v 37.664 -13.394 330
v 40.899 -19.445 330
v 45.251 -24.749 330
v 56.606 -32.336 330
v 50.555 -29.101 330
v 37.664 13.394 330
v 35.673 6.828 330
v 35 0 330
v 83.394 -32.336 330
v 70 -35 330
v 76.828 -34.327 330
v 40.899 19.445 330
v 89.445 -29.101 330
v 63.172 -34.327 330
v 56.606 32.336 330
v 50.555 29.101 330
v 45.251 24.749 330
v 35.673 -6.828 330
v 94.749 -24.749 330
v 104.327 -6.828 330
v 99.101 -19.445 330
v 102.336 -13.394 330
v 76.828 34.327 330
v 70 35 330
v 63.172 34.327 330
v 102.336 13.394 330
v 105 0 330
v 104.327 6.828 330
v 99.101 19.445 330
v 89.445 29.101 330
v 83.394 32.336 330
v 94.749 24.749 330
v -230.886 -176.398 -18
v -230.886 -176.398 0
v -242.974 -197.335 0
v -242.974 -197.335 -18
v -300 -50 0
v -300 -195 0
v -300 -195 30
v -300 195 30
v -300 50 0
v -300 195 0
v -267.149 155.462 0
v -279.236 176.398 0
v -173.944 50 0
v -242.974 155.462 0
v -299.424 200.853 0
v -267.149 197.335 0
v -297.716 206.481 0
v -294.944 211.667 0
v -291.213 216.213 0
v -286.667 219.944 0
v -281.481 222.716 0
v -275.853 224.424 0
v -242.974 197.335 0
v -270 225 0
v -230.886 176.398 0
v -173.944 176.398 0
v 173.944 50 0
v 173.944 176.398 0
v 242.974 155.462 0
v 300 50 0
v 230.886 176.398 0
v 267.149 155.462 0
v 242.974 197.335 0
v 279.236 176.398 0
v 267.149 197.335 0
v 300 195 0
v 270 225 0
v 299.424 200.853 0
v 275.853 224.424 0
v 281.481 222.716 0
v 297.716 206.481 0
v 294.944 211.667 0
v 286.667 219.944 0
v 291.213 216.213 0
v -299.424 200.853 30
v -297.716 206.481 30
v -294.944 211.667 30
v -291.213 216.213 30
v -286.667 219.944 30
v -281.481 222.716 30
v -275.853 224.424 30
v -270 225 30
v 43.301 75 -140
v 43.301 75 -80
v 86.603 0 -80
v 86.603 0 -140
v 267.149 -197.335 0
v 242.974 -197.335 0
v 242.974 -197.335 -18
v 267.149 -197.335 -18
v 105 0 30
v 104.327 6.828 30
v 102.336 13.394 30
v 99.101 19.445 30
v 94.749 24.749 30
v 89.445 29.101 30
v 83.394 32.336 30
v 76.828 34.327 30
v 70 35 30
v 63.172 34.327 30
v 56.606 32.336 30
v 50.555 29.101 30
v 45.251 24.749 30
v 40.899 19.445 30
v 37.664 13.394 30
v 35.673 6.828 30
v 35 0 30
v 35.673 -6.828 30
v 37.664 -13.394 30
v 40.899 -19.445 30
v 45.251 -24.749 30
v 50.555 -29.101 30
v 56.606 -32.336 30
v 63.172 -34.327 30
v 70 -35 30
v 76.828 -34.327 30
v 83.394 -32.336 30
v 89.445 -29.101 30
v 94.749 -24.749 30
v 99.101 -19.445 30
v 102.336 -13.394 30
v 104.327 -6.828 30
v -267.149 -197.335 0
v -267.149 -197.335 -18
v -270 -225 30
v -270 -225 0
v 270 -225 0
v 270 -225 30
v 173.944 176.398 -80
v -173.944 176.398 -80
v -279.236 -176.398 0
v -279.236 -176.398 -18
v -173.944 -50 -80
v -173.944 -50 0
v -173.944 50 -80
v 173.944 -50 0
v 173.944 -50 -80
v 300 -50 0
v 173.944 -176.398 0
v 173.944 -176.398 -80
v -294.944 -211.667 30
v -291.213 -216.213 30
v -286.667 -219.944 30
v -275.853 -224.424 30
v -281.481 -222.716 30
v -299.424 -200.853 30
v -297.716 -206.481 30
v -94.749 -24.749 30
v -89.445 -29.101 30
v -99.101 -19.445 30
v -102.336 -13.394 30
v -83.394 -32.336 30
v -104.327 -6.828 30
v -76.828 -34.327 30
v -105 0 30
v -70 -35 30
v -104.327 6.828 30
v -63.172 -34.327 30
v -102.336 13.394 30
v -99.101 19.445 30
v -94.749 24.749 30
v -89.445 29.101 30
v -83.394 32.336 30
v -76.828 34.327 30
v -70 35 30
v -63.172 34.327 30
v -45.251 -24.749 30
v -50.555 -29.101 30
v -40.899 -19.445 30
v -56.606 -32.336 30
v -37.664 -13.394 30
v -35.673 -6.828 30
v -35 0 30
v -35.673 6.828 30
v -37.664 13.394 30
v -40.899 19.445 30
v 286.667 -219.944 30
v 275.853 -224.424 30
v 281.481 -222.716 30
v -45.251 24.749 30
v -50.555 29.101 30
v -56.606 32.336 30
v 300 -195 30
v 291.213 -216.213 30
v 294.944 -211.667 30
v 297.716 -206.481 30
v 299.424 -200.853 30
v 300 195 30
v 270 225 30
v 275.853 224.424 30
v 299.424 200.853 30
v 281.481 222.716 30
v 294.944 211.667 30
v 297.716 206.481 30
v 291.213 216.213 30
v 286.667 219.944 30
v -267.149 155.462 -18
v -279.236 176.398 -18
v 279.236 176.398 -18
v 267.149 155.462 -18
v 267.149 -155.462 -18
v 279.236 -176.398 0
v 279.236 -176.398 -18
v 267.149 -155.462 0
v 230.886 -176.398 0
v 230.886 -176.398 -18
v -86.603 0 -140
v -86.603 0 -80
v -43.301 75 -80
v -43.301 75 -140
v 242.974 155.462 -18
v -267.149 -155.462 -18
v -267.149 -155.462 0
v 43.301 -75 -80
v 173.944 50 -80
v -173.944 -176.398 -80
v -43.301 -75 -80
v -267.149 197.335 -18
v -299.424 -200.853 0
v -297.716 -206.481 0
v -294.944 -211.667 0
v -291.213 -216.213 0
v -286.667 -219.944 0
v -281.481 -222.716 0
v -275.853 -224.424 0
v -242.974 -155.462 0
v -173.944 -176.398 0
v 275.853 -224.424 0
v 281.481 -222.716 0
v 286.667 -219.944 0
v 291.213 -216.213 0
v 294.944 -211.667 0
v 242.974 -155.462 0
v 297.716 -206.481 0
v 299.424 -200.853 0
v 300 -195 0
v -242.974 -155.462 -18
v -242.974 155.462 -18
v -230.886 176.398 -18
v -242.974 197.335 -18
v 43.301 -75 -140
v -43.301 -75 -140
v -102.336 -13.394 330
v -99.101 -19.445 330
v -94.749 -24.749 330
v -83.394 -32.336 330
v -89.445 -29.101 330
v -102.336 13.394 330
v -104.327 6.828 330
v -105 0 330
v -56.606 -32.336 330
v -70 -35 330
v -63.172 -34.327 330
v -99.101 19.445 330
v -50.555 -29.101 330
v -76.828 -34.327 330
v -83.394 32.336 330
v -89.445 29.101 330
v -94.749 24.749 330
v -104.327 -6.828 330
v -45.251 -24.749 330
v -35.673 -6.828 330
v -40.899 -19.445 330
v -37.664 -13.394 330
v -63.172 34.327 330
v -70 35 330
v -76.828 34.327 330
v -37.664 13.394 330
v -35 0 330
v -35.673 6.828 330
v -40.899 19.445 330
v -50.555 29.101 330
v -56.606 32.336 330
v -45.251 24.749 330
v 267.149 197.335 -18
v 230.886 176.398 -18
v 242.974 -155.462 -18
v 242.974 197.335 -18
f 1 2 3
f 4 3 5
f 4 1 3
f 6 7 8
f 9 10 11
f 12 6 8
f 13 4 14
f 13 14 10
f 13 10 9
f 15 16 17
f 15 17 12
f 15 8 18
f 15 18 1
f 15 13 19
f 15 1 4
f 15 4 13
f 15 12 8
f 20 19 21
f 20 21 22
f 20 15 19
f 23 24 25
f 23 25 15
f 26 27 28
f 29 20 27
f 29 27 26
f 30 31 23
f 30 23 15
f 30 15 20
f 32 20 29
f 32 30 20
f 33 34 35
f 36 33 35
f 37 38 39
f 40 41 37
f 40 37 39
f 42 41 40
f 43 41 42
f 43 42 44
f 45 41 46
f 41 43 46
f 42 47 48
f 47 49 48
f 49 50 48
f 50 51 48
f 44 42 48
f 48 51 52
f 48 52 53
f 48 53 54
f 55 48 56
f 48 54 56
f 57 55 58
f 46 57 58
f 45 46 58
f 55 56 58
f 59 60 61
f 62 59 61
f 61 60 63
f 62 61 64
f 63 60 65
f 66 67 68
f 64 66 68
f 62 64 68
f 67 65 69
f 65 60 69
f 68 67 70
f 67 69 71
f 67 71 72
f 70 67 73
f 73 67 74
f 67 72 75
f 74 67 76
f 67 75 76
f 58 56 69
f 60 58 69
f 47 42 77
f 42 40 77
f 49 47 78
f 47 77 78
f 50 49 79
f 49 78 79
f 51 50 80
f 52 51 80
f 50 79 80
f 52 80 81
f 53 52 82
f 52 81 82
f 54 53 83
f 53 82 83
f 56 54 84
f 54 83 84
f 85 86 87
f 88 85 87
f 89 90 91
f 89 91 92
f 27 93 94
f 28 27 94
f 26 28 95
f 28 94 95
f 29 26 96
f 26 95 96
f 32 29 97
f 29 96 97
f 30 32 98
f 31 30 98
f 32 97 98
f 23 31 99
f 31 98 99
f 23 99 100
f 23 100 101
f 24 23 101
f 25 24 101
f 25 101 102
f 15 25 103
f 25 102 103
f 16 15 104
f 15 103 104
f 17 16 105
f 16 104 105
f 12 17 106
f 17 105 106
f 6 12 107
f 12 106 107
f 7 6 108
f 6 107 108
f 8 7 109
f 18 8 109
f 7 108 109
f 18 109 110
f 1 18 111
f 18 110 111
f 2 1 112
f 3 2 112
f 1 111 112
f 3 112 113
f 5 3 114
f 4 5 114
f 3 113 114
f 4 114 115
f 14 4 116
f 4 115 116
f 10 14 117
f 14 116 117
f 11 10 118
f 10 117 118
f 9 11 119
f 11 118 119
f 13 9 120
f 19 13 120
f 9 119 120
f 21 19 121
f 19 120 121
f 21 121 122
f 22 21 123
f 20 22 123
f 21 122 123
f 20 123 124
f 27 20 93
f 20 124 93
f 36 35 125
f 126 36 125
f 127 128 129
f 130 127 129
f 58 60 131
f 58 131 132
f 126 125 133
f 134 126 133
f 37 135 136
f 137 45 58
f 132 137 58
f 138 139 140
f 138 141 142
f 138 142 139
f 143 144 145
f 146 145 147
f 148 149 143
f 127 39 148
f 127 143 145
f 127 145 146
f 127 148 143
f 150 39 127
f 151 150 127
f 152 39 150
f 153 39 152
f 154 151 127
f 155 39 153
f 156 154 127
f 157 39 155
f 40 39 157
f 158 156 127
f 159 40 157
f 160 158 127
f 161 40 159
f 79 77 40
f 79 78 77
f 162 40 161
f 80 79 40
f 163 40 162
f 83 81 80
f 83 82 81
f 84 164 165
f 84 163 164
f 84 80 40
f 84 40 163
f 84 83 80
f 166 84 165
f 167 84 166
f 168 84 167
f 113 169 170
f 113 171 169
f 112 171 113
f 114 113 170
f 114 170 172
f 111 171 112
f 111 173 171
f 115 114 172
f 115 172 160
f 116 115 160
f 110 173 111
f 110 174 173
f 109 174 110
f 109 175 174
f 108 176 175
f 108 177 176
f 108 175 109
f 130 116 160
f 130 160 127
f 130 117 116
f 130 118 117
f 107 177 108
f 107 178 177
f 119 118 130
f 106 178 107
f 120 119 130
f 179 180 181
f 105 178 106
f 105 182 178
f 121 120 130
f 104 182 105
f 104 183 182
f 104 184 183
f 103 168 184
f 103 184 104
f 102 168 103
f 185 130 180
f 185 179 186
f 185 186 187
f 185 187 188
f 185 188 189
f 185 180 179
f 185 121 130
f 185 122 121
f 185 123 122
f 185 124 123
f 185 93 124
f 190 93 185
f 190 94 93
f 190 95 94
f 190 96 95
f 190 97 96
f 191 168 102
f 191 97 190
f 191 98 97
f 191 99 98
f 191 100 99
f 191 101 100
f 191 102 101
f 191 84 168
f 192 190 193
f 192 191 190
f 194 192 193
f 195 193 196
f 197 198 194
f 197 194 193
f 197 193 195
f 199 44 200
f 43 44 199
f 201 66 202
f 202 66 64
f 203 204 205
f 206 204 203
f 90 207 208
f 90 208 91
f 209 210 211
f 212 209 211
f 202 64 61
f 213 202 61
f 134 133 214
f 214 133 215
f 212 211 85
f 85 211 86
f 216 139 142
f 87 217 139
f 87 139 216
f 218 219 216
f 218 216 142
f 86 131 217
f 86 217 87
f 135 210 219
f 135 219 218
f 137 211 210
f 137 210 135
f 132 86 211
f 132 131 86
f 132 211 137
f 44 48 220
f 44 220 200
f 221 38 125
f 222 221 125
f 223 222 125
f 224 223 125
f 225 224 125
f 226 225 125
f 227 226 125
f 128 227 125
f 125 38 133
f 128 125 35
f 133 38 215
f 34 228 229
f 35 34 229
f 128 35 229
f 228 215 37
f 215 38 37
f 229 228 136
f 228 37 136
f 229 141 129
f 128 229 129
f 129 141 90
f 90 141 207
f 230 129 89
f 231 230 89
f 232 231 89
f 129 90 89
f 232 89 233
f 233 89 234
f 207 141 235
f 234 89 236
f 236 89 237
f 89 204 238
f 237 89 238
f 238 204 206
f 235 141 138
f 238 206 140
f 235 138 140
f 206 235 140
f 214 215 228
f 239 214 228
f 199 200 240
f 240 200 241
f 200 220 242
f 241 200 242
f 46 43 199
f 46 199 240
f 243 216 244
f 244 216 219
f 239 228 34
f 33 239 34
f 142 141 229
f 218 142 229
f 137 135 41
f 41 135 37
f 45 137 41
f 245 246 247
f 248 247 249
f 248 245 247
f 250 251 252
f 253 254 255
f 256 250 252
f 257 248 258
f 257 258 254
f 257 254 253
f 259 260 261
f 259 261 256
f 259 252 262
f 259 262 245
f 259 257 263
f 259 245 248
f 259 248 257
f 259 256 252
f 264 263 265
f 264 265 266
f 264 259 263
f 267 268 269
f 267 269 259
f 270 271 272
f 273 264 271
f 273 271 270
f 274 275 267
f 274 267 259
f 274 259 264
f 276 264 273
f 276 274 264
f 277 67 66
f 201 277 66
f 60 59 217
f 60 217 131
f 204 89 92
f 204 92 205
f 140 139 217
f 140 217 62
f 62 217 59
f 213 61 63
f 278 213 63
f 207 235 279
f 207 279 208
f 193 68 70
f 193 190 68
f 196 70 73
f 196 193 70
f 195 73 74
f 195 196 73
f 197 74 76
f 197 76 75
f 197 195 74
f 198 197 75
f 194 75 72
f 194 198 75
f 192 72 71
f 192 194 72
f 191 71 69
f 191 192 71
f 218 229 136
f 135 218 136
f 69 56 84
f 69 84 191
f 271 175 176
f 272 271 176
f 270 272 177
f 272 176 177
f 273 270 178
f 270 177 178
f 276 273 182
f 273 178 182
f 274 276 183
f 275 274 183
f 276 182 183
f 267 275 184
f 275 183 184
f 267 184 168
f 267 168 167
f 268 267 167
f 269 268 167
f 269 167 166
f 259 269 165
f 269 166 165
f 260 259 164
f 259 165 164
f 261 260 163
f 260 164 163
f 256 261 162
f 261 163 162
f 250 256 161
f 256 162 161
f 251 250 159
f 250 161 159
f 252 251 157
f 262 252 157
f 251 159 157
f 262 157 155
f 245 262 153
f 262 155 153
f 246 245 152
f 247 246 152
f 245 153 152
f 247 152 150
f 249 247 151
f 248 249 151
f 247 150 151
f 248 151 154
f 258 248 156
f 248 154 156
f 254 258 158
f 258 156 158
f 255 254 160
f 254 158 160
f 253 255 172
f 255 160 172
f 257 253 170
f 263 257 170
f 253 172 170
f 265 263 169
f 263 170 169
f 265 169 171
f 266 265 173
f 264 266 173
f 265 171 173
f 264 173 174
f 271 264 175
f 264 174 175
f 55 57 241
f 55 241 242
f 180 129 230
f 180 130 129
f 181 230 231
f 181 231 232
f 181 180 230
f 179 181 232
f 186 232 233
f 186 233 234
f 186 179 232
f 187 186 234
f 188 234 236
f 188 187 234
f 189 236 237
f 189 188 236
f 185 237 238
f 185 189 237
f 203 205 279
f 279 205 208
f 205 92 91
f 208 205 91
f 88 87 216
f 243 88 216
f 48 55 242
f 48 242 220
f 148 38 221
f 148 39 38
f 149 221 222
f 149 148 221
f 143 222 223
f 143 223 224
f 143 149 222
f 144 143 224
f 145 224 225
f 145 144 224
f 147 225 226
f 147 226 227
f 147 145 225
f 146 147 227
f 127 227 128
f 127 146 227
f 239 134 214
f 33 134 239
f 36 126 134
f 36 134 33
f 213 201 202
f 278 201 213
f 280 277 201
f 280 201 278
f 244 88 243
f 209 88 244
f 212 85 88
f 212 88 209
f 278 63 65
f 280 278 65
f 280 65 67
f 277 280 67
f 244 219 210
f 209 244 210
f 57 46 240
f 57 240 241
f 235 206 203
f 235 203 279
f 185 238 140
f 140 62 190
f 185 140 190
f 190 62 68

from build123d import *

# Parameters (mm, degrees)
SKETCH1_W            = 600
SKETCH1_H            = 450
BOSS_EXTRUDE1_DEPTH  = 30
FILLET1_R            = 30
SKETCH2_W            = 347.887186226
SKETCH2_H            = 352.796759622
BOSS_EXTRUDE2_DEPTH  = 80
RIB2_REACH           = 385.438
SKETCH3_WALL_W       = 918.175870934
SKETCH3_WALL_H       = 100
SKETCH4_R            = 35
BOSS_EXTRUDE3_DEPTH  = 300
BOSS_EXTRUDE4_DEPTH  = 60
BOSS_EXTRUDE5_DEPTH  = 18
MIRROR3_COPY_1_DEPTH = 18


with BuildPart() as part:
    # Sketch1 → Boss-Extrude1 (new body)
    with BuildSketch(Plane.XY):
        Rectangle(SKETCH1_W, SKETCH1_H)
    extrude(amount=BOSS_EXTRUDE1_DEPTH)

    # Fillet1
    fillet1_edges = [part.edges().sort_by_distance(p)[0] for p in [
        (300, -225, 15),
        (-300, -225, 15),
        (-300, 225, 15),
        (300, 225, 15),
    ]]
    fillet(fillet1_edges, radius=FILLET1_R)

    # Sketch2 → Boss-Extrude2 (add)
    with BuildSketch(Plane(origin=(0, 0, 0), x_dir=(-1, 0, 0), z_dir=(0, 0, -1))):
        Rectangle(SKETCH2_W, SKETCH2_H)
    extrude(amount=BOSS_EXTRUDE2_DEPTH)

    # Sketch3 wall → Rib2 (add, up to next)
    with BuildSketch(Plane(origin=(236.971796557, 0, -40), x_dir=(0.844321344916, 0, 0.535837164182), z_dir=(0.535837164182, 0, -0.844321344916)), mode=Mode.PRIVATE) as rib2_sk1:
        Rectangle(SKETCH3_WALL_W, SKETCH3_WALL_H)
    rib2_tool1 = extrude(rib2_sk1.sketch, amount=-RIB2_REACH, mode=Mode.PRIVATE) - part.part
    rib2 = rib2_tool1.solids().sort_by_distance((236.971796557, 0, -40))[0]
    add(rib2)

    # Mirror1: Rib2 across plane
    add(rib2.mirror(Plane(origin=(0, 0, 0), x_dir=(0, 0, 1), z_dir=(1, 0, 0))))

    # Sketch4 → Boss-Extrude3 (add)
    with BuildSketch(Plane.XY.offset(30)):
        with Locations((-70, 0)):
            Circle(SKETCH4_R)
        with Locations((70, 0)):
            Circle(SKETCH4_R)
    extrude(amount=BOSS_EXTRUDE3_DEPTH)

    # Sketch5 → Boss-Extrude4 (add)
    with BuildSketch(Plane(origin=(0, 0, -80), x_dir=(-1, 0, 0), z_dir=(0, 0, -1))):
        Polygon((86.602540378, 0), (43.301270189, 75), (-43.301270189, 75), (-86.602540378, 0), (-43.301270189, -75), (43.301270189, -75), align=None)
    extrude(amount=BOSS_EXTRUDE4_DEPTH)

    # Sketch6 → Boss-Extrude5 (add)
    with BuildSketch(Plane(origin=(0, 0, 0), x_dir=(-1, 0, 0), z_dir=(0, 0, -1))):
        Polygon((-230.886428661, 176.398379811), (-242.973945963, 197.334573917), (-267.148980569, 197.334573917), (-279.236497871, 176.398379811), (-267.148980569, 155.462185706), (-242.973945963, 155.462185706), align=None)
    boss_extrude5 = extrude(amount=BOSS_EXTRUDE5_DEPTH)

    # Mirror2: Boss-Extrude5 across plane
    add(boss_extrude5.mirror(Plane(origin=(0, 0, 0), x_dir=(0, 0, 1), z_dir=(1, 0, 0))))

    # Mirror3: Boss-Extrude5 across plane
    add(boss_extrude5.mirror(Plane.ZX))

    # Mirror3 copy 1 sketch → Mirror3 copy 1 (add)
    with BuildSketch(Plane(origin=(0, 0, 0), x_dir=(1, 0, 0), z_dir=(0, 0, -1))):
        Polygon((-230.886428661, 176.398379811), (-242.973945963, 197.334573917), (-267.148980569, 197.334573917), (-279.236497871, 176.398379811), (-267.148980569, 155.462185706), (-242.973945963, 155.462185706), align=None)
    extrude(amount=MIRROR3_COPY_1_DEPTH)


solid = part.part
